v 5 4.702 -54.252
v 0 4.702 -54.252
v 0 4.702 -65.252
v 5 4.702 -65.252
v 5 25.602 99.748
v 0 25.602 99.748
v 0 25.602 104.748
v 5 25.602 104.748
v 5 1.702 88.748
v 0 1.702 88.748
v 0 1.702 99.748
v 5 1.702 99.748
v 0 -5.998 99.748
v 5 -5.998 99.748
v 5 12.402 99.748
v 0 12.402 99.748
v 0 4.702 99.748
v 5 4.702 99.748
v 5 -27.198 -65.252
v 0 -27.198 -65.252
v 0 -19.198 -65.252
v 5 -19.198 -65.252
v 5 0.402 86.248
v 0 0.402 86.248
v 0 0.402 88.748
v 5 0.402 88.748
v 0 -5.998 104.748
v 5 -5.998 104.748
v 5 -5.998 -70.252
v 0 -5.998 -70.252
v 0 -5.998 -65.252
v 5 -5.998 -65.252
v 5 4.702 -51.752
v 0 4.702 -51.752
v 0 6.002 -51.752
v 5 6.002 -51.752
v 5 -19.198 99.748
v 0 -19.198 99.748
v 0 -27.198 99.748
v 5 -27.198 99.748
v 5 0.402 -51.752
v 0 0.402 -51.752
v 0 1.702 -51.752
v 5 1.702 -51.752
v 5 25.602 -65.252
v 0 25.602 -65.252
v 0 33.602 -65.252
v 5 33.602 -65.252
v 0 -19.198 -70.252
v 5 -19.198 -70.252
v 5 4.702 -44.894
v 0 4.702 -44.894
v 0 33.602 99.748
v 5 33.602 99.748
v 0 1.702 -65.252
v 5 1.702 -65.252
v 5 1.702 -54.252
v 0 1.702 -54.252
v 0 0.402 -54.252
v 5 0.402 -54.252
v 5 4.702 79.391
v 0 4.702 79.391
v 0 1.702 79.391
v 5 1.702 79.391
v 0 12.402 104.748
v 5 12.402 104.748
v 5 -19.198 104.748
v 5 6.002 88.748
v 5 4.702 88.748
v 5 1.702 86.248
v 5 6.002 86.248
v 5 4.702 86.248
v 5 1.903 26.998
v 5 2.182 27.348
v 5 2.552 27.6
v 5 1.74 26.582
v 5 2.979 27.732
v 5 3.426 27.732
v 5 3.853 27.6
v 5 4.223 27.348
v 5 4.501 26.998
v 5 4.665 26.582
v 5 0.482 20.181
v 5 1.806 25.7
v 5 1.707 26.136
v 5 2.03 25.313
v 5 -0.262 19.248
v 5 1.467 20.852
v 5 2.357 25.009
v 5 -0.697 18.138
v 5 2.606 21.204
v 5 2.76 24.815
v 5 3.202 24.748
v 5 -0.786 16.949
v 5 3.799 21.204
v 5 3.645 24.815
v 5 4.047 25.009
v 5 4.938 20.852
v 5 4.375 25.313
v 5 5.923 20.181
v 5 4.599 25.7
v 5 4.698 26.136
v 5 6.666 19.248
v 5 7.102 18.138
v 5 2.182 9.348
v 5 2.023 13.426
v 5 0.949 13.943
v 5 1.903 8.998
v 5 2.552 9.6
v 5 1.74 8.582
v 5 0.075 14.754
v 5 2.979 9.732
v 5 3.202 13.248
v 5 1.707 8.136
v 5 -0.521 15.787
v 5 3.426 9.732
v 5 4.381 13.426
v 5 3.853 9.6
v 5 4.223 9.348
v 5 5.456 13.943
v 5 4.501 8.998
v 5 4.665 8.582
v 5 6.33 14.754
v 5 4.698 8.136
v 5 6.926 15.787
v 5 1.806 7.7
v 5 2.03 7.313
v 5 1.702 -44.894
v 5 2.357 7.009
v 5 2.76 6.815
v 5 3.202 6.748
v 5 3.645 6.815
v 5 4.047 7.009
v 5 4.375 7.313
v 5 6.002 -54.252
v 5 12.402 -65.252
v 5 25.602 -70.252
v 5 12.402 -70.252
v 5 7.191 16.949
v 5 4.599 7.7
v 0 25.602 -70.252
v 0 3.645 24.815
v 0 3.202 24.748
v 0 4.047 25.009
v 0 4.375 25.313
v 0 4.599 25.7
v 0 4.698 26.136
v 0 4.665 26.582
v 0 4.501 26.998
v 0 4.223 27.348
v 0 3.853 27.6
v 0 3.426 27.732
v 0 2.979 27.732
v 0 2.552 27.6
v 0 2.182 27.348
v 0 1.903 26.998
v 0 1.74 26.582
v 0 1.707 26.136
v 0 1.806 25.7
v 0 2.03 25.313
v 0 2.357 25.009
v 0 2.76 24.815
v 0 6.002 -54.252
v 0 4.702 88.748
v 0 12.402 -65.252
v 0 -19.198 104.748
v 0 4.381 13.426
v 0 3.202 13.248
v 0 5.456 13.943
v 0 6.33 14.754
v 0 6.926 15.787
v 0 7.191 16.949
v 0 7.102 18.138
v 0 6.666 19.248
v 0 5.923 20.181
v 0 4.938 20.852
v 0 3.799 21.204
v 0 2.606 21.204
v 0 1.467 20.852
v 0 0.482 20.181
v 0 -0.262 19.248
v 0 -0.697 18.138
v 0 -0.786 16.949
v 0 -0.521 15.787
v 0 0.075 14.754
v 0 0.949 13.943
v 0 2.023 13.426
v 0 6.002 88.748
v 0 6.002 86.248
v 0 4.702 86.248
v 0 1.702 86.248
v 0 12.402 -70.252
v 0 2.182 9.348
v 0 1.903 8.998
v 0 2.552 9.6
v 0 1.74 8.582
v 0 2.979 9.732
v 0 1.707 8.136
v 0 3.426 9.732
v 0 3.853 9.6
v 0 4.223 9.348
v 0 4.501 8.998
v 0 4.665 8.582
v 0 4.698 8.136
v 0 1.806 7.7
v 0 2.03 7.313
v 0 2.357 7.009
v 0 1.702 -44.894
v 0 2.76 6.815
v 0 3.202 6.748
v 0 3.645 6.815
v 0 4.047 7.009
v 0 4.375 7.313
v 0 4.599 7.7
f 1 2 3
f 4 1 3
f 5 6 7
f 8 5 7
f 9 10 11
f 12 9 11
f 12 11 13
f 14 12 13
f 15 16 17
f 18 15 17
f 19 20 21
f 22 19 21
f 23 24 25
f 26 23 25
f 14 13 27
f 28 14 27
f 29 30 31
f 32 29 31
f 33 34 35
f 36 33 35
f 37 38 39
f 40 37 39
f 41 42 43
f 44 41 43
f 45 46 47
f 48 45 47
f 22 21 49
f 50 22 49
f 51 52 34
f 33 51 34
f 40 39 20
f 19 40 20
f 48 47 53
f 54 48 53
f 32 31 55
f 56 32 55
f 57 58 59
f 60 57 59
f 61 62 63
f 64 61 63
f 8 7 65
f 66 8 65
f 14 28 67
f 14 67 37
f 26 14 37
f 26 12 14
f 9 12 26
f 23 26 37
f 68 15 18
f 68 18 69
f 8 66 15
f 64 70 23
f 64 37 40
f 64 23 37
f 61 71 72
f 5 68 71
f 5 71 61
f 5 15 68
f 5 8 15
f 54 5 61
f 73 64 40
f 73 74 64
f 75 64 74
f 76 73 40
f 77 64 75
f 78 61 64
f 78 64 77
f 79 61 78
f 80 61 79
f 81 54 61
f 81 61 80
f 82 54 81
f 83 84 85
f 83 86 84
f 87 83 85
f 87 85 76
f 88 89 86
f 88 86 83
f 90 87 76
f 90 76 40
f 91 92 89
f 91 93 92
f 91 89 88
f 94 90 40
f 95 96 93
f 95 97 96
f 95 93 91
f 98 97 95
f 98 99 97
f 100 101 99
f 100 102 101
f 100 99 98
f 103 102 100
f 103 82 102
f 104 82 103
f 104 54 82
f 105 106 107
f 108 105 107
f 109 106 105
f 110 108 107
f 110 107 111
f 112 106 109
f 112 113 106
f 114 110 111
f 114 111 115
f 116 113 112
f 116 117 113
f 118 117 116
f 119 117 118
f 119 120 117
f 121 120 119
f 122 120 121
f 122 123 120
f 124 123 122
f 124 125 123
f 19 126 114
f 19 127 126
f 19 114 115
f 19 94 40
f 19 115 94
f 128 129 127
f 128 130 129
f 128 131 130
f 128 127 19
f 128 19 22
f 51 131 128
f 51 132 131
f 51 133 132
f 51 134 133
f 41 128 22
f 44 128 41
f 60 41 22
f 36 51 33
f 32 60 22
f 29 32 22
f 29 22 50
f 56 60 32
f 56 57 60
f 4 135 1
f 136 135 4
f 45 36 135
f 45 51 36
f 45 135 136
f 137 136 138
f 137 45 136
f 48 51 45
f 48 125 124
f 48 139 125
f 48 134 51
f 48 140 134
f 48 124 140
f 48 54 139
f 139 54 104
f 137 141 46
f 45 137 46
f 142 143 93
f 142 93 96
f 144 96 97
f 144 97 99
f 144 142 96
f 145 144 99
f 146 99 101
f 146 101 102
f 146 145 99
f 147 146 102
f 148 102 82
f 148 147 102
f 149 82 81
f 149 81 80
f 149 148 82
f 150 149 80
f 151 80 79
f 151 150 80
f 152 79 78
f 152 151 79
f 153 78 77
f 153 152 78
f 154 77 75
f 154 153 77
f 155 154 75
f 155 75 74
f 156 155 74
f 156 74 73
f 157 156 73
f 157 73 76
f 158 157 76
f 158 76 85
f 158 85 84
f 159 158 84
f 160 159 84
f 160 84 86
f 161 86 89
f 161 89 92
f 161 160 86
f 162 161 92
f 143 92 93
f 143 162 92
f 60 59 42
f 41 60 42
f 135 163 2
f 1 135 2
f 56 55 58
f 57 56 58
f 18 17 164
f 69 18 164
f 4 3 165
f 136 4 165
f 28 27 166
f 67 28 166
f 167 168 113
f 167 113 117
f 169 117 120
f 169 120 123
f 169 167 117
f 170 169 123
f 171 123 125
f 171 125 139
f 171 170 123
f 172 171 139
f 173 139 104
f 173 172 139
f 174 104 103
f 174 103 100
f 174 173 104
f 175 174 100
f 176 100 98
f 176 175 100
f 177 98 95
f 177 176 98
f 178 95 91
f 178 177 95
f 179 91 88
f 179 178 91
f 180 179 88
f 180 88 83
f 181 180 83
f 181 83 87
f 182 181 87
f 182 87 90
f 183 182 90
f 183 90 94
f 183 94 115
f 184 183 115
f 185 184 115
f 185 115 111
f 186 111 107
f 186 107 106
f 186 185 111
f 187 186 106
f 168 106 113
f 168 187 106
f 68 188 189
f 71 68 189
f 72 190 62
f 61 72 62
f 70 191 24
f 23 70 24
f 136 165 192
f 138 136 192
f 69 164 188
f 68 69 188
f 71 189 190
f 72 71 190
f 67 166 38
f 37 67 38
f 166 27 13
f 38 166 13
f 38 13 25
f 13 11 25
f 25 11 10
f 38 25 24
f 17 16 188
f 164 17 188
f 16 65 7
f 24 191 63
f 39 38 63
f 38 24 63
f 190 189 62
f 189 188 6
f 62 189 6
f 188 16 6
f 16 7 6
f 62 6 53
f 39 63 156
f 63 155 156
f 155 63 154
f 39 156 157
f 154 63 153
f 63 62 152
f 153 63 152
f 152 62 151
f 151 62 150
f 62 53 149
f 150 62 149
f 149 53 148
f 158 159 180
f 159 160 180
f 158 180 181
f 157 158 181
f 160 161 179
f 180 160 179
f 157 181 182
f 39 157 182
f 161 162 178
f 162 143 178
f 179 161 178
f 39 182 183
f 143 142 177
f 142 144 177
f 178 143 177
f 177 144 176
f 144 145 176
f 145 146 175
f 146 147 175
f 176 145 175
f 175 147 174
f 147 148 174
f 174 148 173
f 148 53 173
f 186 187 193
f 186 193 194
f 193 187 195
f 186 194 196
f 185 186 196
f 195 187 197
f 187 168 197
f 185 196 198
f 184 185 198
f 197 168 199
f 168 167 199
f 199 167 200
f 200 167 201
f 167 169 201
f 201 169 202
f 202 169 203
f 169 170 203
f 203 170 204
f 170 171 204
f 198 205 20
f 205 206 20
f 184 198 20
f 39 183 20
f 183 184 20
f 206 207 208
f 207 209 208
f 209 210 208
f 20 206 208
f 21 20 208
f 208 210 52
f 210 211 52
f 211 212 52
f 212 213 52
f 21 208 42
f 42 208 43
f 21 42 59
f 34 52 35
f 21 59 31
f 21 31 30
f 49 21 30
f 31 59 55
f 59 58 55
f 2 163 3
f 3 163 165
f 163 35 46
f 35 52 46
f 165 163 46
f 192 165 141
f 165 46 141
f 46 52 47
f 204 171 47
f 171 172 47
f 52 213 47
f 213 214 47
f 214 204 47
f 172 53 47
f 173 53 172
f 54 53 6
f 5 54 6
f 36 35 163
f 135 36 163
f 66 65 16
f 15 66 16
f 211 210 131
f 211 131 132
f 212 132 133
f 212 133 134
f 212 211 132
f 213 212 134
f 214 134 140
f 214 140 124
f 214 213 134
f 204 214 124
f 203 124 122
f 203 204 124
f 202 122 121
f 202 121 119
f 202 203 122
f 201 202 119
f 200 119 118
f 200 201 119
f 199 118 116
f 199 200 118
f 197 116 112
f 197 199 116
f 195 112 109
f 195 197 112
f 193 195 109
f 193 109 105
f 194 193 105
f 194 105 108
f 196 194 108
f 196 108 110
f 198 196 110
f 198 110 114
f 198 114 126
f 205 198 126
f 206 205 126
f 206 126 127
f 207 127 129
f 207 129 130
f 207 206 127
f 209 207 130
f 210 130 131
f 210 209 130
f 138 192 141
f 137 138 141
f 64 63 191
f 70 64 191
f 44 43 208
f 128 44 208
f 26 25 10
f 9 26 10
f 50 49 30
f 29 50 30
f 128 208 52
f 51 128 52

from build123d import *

# Parameters (mm, degrees)
SKETCH1_R           = 4
SKETCH1_R_2         = 1.5
BOSS_EXTRUDE1_DEPTH = 5


with BuildPart() as part:
    # Sketch1 → Boss-Extrude1 (new body)
    with BuildSketch(Plane(origin=(0, 0, 0), x_dir=(0, 0, -1), z_dir=(1, 0, 0))):
        Polygon((70.251703358, 12.402398233), (70.251703358, 25.602398233), (65.251703358, 25.602398233), (65.251703358, 33.602398233), (-99.748296642, 33.602398233), (-99.748296642, 25.602398233), (-104.748296642, 25.602398233), (-104.748296642, 12.402398233), (-99.748296642, 12.402398233), (-99.748296642, 4.702398233), (-88.748296642, 4.702398233), (-88.748296642, 6.002398233), (-86.248296642, 6.002398233), (-86.248296642, 4.702398233), (-79.39106139, 4.702398233), (-79.39106139, 1.702398233), (-86.248296642, 1.702398233), (-86.248296642, 0.402398233), (-88.748296642, 0.402398233), (-88.748296642, 1.702398233), (-99.748296642, 1.702398233), (-99.748296642, -5.997601767), (-104.748296642, -5.997601767), (-104.748296642, -19.197601767), (-99.748296642, -19.197601767), (-99.748296642, -27.197601767), (65.251703358, -27.197601767), (65.251703358, -19.197601767), (70.251703358, -19.197601767), (70.251703358, -5.997601767), (65.251703358, -5.997601767), (65.251703358, 1.702398233), (54.251703358, 1.702398233), (54.251703358, 0.402398233), (51.751703358, 0.402398233), (51.751703358, 1.702398233), (44.894468105, 1.702398233), (44.894468105, 4.702398233), (51.751703358, 4.702398233), (51.751703358, 6.002398233), (54.251703358, 6.002398233), (54.251703358, 4.702398233), (65.251703358, 4.702398233), (65.251703358, 12.402398233), align=None)
        with Locations((-17.248296642, 3.202398233)):
            Circle(SKETCH1_R, mode=Mode.SUBTRACT)
        with Locations((-26.248296642, 3.202398233)):
            Circle(SKETCH1_R_2, mode=Mode.SUBTRACT)
        with Locations((-8.248296642, 3.202398233)):
            Circle(SKETCH1_R_2, mode=Mode.SUBTRACT)
    extrude(amount=BOSS_EXTRUDE1_DEPTH)


solid = part.part
